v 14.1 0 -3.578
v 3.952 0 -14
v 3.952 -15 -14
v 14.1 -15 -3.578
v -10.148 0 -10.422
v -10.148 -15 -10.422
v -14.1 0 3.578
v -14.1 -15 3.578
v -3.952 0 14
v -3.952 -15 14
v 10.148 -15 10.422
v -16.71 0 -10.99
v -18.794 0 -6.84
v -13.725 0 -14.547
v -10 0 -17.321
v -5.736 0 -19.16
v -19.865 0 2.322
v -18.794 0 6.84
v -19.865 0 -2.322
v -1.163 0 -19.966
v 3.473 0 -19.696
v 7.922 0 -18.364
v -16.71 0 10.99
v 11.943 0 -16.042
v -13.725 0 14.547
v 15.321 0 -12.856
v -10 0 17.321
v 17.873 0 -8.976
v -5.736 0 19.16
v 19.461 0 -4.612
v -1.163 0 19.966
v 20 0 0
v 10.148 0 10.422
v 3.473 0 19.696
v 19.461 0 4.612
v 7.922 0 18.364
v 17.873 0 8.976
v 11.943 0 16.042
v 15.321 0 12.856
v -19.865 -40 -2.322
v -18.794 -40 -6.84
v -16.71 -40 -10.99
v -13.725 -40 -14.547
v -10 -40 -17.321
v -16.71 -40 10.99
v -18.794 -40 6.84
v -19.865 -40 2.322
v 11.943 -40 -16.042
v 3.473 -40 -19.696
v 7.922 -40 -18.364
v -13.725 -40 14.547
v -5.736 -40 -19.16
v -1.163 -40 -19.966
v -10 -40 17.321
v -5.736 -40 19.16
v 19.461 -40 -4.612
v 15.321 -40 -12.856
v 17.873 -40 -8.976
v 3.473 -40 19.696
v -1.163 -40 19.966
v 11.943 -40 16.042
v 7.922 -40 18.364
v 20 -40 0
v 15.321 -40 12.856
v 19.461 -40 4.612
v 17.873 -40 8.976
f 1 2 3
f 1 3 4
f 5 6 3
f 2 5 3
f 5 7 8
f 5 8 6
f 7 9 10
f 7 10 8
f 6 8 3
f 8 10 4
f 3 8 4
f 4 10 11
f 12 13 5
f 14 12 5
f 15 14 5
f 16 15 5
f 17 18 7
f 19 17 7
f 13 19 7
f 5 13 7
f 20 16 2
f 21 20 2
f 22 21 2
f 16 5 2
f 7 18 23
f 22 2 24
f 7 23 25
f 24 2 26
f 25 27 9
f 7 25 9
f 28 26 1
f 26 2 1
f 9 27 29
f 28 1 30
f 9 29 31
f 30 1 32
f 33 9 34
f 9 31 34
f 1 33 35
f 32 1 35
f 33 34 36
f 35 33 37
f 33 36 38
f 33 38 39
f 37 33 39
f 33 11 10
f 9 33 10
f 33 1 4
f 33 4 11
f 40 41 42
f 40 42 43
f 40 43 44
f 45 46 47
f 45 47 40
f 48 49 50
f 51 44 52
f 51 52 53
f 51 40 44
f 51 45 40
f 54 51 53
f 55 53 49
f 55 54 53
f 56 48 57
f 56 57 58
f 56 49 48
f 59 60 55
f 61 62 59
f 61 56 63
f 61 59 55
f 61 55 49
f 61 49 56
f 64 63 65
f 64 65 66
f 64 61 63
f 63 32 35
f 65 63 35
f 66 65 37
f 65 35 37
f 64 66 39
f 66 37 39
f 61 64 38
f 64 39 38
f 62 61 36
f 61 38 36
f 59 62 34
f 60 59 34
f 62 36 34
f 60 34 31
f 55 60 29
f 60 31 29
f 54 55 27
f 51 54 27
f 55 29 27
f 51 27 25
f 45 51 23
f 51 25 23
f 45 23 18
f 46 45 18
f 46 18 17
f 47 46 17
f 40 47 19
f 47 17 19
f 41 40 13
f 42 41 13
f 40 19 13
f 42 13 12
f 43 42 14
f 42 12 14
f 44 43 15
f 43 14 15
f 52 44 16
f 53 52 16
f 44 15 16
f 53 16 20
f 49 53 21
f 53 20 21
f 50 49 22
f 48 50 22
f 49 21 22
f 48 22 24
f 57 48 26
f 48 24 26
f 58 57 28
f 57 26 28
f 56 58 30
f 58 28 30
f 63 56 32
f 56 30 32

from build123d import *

# Parameters (mm, degrees)
F0_R     = 20
F1_DEPTH = 40
F3_DEPTH = 15


with BuildPart() as f1:
    # F0 (on Front) → F1 (new body)
    with BuildSketch(Plane.XZ):
        Circle(F0_R)
    extrude(amount=F1_DEPTH)

    # F2 (on Front) → F3 (cut)
    with BuildSketch(Plane.XZ):
        Polygon((3.95189, -14), (14.1003, -3.577563), (10.148411, 10.422437), (-3.95189, 14), (-14.1003, 3.577563), (-10.148411, -10.422437), align=None)
    extrude(amount=F3_DEPTH, mode=Mode.SUBTRACT)


solid = f1.part
